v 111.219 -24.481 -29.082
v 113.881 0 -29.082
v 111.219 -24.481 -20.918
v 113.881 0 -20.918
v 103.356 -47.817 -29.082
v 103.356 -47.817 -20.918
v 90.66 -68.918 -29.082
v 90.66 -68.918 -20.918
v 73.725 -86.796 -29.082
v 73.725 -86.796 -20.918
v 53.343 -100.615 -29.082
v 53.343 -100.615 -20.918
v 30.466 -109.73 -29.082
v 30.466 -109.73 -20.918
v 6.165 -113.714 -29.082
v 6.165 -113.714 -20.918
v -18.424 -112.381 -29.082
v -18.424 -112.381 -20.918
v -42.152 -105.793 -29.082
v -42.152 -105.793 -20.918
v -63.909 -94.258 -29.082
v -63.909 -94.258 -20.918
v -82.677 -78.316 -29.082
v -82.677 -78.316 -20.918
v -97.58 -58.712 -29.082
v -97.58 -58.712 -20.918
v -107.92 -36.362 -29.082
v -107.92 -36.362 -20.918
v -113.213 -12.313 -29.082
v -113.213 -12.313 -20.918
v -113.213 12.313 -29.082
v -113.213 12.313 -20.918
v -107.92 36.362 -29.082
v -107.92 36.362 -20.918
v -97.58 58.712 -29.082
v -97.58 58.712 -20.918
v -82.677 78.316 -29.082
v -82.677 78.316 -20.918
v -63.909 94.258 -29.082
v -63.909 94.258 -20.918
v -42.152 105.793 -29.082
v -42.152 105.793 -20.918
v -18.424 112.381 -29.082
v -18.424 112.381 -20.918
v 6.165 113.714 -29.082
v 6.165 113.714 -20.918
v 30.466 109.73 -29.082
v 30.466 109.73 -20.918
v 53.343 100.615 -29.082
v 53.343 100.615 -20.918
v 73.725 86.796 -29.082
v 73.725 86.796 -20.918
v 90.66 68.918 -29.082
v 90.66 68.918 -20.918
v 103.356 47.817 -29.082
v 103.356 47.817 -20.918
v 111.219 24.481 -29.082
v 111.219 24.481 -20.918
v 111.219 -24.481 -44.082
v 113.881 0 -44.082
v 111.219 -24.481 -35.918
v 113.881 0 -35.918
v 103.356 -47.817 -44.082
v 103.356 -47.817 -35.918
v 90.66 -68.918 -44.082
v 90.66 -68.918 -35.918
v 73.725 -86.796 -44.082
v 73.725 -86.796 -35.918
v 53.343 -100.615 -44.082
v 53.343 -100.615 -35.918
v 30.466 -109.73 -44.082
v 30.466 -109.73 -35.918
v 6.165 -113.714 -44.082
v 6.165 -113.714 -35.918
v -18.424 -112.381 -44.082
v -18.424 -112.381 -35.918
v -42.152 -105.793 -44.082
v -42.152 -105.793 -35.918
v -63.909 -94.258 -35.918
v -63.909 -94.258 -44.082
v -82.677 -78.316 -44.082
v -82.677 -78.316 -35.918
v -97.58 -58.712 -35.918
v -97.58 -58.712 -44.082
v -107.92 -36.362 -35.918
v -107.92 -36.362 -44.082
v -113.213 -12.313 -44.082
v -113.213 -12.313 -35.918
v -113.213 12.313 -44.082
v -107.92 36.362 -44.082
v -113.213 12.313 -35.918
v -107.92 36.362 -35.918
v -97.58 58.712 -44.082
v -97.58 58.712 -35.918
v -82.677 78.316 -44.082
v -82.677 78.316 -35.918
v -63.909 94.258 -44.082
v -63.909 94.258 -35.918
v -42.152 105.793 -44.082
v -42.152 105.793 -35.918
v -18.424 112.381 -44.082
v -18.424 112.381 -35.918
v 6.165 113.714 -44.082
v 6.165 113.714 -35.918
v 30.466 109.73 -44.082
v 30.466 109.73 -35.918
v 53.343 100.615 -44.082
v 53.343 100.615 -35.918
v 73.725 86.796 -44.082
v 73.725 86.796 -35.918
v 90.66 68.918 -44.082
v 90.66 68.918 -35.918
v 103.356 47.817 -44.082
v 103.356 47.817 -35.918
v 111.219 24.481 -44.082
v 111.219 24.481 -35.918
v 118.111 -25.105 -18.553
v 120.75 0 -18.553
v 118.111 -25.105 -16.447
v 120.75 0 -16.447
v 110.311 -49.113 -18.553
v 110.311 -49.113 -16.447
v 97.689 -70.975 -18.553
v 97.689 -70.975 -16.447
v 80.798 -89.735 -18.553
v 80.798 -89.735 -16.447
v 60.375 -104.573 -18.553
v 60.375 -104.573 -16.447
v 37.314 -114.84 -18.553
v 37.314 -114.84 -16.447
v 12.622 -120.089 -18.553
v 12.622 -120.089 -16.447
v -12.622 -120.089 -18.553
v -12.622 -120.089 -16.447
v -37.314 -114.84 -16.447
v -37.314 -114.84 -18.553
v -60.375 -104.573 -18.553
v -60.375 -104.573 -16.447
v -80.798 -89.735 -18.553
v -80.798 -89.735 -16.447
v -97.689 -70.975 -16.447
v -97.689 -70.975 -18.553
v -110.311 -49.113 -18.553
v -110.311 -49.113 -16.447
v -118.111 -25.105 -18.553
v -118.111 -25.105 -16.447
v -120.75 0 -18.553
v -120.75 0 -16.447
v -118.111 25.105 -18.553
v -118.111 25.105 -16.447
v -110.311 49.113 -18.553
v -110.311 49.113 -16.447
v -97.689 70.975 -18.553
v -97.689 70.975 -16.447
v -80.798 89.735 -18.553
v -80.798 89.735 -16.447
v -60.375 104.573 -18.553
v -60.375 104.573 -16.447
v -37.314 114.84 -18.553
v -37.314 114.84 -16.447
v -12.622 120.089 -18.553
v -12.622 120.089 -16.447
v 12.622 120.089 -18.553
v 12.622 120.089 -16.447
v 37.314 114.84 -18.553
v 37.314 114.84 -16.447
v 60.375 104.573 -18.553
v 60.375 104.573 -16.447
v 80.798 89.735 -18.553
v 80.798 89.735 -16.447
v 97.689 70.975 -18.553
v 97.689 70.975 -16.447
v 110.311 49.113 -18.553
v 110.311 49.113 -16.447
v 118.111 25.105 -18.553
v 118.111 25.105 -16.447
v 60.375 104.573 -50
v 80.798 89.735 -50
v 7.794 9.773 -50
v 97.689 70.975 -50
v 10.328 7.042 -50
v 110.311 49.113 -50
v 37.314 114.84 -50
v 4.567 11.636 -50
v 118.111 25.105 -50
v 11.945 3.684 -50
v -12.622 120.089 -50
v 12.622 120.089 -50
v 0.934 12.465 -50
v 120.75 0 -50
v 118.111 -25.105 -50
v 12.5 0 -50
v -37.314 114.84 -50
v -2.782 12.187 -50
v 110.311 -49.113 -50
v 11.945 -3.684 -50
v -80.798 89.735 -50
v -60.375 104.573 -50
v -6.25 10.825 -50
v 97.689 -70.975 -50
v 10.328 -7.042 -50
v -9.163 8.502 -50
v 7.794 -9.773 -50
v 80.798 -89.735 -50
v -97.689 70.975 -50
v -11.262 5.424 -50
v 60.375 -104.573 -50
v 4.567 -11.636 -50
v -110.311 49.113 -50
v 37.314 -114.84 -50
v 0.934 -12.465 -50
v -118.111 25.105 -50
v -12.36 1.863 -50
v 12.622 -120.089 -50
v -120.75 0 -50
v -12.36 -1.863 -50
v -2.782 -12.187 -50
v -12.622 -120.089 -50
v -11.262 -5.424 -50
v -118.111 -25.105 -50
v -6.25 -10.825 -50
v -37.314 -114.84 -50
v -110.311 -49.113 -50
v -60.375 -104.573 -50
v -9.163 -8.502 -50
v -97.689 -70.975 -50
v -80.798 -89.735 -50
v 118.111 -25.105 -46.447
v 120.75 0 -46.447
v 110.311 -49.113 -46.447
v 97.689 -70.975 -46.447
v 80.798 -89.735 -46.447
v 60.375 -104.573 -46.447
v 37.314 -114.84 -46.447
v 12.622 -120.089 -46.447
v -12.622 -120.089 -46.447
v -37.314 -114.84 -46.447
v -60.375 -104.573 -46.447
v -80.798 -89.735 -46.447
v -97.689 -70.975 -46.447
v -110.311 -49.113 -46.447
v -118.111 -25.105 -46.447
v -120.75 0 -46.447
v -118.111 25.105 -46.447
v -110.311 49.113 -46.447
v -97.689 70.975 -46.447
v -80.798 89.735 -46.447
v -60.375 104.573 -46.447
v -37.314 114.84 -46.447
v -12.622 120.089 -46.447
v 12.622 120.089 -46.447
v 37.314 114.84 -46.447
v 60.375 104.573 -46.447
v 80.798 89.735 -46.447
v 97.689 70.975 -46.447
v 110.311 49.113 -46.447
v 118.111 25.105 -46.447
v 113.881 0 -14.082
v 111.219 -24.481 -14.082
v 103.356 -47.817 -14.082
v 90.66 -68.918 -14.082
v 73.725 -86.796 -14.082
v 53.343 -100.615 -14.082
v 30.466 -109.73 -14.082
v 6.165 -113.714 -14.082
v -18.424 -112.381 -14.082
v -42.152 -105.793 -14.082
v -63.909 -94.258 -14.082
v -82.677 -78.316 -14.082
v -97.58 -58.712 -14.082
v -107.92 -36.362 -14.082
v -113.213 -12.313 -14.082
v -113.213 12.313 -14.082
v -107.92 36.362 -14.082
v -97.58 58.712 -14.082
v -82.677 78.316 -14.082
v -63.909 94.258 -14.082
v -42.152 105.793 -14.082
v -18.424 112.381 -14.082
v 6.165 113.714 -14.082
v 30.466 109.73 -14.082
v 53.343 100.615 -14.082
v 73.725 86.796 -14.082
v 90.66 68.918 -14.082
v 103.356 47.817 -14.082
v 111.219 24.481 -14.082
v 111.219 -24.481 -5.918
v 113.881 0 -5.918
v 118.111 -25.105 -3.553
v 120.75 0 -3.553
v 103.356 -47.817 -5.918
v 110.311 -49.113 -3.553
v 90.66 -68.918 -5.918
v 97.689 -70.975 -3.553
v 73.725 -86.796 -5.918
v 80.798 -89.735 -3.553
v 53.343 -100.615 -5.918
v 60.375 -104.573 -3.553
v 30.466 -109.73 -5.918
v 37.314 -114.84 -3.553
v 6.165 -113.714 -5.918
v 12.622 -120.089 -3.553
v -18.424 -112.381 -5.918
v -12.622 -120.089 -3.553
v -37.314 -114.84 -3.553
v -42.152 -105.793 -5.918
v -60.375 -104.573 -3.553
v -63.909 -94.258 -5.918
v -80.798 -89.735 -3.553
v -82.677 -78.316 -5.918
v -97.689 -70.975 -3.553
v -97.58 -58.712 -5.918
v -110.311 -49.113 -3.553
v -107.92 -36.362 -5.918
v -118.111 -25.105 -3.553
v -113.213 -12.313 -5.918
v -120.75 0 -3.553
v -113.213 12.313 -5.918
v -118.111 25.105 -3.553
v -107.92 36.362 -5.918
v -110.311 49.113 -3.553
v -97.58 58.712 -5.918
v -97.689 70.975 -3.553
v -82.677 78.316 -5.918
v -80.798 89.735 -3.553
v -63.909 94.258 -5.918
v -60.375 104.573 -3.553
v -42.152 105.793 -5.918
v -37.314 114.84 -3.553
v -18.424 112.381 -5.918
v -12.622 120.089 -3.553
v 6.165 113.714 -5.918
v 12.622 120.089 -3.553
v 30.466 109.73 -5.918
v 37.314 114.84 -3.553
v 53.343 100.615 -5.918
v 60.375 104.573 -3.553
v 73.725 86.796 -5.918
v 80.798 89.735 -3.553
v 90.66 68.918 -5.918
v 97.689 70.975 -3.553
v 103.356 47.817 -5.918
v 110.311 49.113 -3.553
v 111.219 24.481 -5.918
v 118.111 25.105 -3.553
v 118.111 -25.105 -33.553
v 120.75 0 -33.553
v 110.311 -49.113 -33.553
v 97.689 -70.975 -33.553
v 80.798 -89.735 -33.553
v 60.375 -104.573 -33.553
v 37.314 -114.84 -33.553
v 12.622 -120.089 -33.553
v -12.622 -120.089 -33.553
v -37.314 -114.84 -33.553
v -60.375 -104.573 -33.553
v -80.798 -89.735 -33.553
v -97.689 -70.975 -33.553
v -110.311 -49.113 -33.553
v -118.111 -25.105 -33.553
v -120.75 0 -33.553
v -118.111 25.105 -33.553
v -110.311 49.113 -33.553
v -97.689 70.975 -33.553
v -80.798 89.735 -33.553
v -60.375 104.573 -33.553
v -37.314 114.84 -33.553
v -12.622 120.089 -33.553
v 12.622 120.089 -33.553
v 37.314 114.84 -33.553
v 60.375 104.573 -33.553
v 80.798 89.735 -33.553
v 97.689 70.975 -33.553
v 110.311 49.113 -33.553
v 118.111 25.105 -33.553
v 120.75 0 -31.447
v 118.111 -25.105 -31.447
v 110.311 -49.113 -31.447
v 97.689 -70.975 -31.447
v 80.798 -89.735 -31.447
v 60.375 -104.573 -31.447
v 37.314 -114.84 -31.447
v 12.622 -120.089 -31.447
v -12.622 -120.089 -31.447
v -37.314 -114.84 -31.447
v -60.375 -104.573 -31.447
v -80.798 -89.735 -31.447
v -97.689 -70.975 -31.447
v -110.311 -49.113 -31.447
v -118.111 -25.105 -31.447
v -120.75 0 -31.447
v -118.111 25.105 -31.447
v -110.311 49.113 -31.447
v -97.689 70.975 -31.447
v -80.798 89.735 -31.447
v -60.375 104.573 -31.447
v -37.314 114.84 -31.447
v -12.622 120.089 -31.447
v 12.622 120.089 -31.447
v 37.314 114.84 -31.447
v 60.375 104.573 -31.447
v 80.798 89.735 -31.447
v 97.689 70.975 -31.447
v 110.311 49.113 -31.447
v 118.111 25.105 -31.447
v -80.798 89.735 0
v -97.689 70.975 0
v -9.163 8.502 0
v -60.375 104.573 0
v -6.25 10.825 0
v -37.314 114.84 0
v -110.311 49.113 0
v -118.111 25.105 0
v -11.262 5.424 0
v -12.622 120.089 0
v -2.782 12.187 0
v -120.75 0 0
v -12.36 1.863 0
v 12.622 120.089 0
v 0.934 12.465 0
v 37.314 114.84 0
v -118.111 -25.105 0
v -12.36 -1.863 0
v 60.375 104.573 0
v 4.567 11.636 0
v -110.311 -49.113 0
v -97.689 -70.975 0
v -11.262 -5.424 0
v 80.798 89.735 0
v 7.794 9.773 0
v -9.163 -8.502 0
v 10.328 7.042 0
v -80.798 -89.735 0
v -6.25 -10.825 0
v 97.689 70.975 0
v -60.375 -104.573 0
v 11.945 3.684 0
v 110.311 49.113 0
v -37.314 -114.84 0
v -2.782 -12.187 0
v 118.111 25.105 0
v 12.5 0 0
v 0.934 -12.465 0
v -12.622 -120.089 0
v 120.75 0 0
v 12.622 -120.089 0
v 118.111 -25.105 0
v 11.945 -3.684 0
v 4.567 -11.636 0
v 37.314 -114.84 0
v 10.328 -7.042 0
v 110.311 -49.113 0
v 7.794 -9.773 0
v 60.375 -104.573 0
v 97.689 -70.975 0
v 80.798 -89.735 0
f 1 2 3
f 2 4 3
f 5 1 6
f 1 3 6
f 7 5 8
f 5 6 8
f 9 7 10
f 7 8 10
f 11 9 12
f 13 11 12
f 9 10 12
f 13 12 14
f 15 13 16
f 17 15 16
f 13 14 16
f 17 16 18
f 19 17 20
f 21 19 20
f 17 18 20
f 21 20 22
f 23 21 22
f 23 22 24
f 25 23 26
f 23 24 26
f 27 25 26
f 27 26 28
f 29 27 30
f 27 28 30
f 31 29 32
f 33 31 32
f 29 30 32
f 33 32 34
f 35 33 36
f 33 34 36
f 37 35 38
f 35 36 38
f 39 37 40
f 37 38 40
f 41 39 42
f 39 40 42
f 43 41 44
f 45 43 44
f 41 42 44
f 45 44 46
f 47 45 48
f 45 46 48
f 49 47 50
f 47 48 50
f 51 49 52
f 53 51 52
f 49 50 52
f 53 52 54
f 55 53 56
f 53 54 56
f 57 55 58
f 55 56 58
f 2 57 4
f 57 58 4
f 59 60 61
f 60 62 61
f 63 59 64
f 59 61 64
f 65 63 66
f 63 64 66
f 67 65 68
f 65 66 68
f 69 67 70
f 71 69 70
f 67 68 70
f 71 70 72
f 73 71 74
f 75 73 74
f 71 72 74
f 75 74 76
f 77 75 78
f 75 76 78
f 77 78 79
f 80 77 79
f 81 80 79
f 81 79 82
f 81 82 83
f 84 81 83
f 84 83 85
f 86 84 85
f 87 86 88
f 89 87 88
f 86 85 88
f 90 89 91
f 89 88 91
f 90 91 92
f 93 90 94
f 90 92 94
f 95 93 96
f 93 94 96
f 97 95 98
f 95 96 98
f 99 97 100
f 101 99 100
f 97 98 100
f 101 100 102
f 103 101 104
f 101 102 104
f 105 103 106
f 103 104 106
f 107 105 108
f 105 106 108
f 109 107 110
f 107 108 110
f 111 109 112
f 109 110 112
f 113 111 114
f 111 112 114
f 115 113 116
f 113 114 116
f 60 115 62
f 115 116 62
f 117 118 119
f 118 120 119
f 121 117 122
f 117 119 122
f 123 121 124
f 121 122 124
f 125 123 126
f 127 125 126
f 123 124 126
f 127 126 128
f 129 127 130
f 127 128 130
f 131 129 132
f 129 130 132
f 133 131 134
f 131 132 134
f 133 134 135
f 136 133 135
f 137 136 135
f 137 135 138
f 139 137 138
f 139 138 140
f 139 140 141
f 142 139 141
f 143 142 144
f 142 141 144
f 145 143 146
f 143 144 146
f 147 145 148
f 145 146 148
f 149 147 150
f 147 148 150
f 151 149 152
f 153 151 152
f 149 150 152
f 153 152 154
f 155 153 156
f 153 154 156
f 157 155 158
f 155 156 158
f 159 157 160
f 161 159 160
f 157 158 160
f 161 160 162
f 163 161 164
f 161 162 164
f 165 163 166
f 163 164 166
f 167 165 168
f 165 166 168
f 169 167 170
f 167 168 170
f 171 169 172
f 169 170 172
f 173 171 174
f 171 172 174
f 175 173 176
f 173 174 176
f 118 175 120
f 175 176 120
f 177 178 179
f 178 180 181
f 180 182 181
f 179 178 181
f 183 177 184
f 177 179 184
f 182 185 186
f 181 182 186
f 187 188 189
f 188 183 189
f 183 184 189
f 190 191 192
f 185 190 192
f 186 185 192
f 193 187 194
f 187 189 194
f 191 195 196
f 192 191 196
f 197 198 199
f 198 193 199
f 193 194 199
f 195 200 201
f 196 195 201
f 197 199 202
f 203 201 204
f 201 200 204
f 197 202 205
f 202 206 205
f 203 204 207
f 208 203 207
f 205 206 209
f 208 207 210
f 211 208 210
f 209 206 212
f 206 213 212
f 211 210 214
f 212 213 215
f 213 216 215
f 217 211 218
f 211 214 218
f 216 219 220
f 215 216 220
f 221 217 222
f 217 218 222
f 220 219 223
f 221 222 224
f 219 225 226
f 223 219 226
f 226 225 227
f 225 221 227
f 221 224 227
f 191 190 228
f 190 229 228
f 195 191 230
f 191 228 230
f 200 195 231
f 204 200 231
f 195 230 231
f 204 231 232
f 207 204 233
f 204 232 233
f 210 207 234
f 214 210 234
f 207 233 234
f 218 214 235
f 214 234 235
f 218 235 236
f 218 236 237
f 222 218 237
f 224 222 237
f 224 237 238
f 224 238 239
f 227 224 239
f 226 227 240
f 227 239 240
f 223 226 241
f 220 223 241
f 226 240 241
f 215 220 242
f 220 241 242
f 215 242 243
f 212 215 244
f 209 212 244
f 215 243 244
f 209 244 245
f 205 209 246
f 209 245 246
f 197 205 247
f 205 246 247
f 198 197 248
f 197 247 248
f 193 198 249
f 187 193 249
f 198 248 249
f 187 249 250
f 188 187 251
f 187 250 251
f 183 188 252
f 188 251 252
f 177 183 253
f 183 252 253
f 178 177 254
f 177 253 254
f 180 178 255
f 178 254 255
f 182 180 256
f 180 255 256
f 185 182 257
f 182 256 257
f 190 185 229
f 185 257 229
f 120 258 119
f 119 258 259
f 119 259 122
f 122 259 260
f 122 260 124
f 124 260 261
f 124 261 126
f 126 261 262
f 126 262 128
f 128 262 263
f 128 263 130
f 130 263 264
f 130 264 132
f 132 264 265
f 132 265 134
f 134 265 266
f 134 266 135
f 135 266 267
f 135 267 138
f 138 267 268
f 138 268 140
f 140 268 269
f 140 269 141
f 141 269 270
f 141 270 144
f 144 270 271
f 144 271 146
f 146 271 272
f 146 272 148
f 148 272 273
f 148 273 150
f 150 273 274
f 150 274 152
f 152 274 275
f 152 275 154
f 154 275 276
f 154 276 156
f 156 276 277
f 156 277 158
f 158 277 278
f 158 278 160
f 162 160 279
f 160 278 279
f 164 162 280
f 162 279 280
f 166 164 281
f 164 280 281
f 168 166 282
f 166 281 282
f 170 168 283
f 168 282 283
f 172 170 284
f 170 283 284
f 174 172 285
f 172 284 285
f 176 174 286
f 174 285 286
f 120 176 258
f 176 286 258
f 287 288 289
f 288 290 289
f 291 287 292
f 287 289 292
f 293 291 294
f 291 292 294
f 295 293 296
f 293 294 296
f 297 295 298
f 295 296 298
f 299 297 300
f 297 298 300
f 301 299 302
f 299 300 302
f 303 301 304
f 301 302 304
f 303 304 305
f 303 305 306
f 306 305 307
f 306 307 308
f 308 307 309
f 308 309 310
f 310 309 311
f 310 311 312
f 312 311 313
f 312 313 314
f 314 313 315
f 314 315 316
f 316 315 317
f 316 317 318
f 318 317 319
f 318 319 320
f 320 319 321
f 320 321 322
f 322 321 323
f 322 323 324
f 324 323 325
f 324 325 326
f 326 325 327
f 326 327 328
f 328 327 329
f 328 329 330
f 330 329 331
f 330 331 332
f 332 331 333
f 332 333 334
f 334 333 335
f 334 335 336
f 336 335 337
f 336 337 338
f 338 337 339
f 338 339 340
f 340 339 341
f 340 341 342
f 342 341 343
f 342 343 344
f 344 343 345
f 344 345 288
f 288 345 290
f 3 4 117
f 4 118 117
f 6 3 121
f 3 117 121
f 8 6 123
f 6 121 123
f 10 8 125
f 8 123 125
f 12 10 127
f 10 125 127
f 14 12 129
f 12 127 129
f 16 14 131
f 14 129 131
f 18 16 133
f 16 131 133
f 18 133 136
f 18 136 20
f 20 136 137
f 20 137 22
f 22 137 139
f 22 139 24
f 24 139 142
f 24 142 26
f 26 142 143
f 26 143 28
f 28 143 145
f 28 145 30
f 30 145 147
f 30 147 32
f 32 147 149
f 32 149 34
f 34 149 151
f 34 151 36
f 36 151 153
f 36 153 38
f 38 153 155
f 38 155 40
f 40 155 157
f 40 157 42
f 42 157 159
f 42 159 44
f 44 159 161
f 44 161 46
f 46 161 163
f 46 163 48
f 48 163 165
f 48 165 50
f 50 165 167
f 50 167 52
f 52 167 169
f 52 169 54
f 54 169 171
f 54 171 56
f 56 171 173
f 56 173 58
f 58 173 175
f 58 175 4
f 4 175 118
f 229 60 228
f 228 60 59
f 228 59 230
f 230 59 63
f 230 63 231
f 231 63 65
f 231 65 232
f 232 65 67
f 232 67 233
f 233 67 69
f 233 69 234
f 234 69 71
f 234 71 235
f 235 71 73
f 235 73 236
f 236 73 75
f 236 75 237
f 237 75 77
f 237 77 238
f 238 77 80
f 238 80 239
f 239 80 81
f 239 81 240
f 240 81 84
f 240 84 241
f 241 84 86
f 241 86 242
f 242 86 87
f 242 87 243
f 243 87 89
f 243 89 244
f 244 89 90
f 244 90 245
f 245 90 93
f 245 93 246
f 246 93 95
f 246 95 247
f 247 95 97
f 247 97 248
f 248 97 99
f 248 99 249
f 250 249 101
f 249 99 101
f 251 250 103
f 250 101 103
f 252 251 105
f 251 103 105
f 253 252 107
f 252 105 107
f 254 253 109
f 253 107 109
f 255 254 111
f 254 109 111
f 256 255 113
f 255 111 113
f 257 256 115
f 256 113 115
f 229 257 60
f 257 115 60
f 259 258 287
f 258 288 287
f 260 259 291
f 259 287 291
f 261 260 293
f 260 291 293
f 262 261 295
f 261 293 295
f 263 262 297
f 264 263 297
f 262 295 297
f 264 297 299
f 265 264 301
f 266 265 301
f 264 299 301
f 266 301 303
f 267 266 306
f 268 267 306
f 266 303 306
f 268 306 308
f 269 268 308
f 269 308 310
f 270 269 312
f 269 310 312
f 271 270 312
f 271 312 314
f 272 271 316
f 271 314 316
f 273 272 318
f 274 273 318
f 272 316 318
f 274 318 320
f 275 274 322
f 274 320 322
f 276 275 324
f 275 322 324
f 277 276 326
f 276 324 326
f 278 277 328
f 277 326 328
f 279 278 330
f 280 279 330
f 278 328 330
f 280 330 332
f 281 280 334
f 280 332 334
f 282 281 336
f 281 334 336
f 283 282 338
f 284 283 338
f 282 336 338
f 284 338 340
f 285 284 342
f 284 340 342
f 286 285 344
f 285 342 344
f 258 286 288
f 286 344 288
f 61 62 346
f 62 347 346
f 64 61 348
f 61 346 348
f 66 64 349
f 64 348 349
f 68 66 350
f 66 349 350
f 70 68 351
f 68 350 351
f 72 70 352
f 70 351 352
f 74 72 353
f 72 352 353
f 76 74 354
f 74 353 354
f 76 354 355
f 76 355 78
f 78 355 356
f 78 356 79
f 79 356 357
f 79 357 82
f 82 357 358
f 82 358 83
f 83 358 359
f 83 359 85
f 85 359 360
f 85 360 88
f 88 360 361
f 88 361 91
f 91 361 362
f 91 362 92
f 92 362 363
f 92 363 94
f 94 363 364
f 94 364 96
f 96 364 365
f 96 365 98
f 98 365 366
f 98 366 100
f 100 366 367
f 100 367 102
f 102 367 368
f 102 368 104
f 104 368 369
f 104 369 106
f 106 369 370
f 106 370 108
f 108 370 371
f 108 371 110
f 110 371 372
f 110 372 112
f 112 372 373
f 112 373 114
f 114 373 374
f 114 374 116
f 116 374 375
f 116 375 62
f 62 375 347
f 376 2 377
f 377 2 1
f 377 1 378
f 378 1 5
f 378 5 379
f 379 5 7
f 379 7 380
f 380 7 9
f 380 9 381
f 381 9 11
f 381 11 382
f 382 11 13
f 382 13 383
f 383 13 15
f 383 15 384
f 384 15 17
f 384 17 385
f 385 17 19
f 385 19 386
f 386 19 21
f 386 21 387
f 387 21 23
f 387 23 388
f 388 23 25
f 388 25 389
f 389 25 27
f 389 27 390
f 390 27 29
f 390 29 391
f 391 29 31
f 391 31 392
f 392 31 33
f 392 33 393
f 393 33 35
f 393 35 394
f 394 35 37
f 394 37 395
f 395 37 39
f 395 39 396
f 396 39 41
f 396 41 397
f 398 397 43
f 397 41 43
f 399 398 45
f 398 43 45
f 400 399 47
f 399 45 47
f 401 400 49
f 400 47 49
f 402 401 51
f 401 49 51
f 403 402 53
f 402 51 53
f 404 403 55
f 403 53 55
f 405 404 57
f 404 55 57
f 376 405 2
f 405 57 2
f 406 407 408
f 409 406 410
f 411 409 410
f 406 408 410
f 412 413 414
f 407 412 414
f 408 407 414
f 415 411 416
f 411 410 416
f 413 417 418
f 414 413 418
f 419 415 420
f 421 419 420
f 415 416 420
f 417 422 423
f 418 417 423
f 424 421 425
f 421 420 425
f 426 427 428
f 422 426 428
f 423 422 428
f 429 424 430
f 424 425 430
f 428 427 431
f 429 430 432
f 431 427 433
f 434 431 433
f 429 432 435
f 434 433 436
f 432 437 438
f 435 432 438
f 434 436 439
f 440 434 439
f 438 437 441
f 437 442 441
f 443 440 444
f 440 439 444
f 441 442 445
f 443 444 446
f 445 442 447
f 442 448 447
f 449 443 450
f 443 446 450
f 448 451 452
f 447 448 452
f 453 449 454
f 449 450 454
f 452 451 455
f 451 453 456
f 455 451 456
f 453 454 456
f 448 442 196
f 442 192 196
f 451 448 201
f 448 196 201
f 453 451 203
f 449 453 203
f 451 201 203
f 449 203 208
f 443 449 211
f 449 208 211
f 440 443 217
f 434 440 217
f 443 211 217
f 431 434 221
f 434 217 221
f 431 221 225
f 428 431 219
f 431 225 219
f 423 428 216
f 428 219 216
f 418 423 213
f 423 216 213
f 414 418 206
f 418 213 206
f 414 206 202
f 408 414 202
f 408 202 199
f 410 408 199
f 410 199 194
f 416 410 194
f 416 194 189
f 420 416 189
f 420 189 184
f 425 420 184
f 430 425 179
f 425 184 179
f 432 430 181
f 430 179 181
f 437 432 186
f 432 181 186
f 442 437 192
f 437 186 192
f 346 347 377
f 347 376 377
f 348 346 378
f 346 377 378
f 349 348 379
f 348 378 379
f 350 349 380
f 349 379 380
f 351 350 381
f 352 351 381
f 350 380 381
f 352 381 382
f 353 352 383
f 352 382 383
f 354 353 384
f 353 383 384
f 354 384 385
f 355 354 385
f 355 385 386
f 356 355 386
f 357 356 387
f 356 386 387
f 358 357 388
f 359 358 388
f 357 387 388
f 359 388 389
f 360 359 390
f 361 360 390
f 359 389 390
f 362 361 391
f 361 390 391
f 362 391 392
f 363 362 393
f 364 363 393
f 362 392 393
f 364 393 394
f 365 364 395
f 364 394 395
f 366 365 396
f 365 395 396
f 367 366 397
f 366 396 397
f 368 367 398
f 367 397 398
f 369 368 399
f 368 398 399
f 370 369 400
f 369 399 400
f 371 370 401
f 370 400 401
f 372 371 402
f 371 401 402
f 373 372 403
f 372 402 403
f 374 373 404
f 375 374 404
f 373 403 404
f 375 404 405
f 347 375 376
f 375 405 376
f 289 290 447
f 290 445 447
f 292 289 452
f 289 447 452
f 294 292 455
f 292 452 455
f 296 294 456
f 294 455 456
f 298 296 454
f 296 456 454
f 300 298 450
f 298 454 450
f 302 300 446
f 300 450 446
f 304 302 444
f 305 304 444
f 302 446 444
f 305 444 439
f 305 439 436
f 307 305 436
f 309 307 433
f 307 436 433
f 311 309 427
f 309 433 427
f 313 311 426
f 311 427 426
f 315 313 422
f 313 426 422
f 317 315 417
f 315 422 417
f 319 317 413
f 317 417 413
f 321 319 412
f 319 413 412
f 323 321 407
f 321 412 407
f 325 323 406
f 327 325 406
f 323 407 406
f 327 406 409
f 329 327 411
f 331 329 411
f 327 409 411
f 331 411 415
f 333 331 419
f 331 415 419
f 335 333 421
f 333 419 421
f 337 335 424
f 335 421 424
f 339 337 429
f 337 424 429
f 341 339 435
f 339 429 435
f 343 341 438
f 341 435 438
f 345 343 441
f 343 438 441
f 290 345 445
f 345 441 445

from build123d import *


with BuildPart() as part:
    # 草图2 → 旋转1 (revolve)
    with BuildSketch(Plane(origin=(0, 0, 0), x_dir=(0, 0, -1), z_dir=(1, 0, 0)), mode=Mode.PRIVATE) as revolve_1_sk:
        Polygon((0, 12.5), (50, 12.5), (50, 120.75), (46.446900937, 120.75), (44.081734967, 113.881059263), (35.918265033, 113.881059263), (33.553099063, 120.75), (31.446900937, 120.75), (29.081734967, 113.881059263), (20.918265033, 113.881059263), (18.553099063, 120.75), (16.446900937, 120.75), (14.081734967, 113.881059263), (5.918265033, 113.881059263), (3.553099063, 120.75), (0, 120.75), align=None)
    revolve(revolve_1_sk.sketch.rotate(Axis((0, 0, 0), (0, 0, -1)), 90), axis=Axis((0, 0, 0), (0, 0, -1)))


solid = part.part
